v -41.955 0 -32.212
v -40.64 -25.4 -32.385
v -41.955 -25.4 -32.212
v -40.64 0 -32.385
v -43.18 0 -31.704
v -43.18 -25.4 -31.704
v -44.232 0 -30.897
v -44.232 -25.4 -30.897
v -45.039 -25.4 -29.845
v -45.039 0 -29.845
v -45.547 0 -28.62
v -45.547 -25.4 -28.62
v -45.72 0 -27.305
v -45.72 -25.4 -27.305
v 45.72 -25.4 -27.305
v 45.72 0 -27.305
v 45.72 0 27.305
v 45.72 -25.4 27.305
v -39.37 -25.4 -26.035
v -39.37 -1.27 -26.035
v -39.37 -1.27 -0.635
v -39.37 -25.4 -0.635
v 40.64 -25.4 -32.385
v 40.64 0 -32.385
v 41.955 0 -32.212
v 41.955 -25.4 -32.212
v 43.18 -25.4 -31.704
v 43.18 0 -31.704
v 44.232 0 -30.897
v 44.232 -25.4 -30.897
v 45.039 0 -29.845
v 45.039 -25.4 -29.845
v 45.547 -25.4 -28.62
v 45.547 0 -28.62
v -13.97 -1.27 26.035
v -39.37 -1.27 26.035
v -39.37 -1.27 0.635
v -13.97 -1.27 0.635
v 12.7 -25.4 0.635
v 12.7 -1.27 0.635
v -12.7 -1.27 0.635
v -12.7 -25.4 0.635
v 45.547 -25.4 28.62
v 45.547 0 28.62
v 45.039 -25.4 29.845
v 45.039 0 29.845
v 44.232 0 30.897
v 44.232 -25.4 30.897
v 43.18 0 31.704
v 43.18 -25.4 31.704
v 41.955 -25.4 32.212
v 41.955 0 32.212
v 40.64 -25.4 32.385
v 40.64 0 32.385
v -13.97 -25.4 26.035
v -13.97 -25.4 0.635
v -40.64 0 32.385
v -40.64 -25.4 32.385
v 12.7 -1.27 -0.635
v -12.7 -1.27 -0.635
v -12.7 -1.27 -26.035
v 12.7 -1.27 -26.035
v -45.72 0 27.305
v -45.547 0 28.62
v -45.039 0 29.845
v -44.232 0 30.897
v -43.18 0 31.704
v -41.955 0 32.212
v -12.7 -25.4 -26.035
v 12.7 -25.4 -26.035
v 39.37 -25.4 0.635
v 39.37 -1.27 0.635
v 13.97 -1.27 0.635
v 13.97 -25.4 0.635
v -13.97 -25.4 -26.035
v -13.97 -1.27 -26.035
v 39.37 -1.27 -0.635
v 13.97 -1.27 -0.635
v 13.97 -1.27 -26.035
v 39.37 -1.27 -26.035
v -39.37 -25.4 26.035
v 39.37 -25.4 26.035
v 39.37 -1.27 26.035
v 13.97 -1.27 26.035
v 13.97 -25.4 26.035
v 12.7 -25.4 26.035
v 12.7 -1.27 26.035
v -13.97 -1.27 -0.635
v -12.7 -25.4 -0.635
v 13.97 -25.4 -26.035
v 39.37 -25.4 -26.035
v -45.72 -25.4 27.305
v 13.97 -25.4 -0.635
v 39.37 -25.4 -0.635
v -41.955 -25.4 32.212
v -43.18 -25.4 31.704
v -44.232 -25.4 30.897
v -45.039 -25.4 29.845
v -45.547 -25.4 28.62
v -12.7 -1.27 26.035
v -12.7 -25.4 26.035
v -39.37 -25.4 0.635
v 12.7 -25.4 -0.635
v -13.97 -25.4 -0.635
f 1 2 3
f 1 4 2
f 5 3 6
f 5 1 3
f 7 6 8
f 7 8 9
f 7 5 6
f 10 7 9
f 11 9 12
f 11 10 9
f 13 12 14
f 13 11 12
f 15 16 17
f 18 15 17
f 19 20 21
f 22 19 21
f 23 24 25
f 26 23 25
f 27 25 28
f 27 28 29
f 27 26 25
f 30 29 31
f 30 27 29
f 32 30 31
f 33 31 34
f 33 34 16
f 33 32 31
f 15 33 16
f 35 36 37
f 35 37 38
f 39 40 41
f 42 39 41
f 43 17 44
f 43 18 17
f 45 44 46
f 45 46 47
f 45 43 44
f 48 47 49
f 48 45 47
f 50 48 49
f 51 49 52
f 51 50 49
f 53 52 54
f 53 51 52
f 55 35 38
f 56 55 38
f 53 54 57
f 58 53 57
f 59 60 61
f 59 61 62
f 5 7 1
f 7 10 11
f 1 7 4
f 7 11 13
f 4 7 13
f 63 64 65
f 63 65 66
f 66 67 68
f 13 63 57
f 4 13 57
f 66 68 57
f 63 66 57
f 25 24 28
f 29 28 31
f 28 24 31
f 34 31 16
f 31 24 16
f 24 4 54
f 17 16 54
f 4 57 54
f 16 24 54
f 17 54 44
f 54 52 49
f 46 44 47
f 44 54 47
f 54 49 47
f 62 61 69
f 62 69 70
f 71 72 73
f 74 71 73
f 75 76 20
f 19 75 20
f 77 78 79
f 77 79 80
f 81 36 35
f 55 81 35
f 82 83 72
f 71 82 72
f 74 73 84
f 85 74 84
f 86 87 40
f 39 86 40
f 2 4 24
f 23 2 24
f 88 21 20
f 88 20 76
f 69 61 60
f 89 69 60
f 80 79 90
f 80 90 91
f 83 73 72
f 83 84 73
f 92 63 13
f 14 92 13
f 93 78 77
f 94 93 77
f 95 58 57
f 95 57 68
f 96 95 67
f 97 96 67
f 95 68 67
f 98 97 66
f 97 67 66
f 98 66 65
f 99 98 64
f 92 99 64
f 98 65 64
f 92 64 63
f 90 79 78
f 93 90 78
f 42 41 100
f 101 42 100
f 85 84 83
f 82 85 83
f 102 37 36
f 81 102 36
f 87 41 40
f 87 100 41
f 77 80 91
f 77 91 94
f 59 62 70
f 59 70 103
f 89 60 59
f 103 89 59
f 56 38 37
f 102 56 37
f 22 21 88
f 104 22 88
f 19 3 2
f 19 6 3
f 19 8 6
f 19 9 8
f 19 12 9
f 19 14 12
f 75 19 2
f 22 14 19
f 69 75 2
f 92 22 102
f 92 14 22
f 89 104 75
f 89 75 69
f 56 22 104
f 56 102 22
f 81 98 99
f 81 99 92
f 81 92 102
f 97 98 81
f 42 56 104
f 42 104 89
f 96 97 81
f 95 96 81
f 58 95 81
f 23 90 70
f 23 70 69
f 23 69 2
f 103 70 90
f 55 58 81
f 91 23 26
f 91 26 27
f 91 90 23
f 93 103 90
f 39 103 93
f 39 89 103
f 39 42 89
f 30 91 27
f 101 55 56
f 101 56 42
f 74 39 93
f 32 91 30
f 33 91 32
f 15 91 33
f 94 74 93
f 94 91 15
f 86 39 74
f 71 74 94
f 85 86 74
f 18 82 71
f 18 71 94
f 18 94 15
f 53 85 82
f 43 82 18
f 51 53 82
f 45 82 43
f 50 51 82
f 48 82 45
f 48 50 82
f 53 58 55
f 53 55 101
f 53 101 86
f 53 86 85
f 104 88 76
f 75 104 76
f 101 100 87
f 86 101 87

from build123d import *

# Parameters (mm, degrees)
F0_W     = 25.4
F0_H     = 25.4
F1_DEPTH = 25.4
F2_W     = 91.44
F2_H     = 64.77
F3_DEPTH = 1.27
F4_R     = 5.08


with BuildPart() as f1:
    # F0 (on Front) → F1 (new body)
    with BuildSketch(Plane.XZ):
        Polygon((-45.72, -32.385), (45.72, -32.385), (45.72, 32.385), (-38.428448, 32.385), (-45.72, 32.385), (-45.72, 27.392585), align=None)
        Polygon((-39.37, -0.635), (-36.457758, -0.635), (-13.97, -0.635), (-13.97, -26.035), (-39.37, -26.035), align=None, mode=Mode.SUBTRACT)
        with Locations((0, -13.335)):
            Rectangle(F0_W, F0_H, mode=Mode.SUBTRACT)
        with Locations((26.67, -13.335)):
            Rectangle(F0_W, F0_H, mode=Mode.SUBTRACT)
        Polygon((-39.37, 26.035), (-38.428448, 26.035), (-13.97, 26.035), (-13.97, 13.335), (-13.97, 0.635), (-36.457758, 0.635), (-39.37, 0.635), align=None, mode=Mode.SUBTRACT)
        Polygon((-12.7, 0.635), (-12.7, 13.335), (-12.7, 26.035), (12.7, 26.035), (12.7, 15.568449), (12.7, 0.635), align=None, mode=Mode.SUBTRACT)
        Polygon((13.97, 0.635), (13.97, 15.568449), (13.97, 26.035), (39.37, 26.035), (39.37, 0.635), align=None, mode=Mode.SUBTRACT)
    extrude(amount=F1_DEPTH)

    # F2 (on Front) → F3 (join)
    with BuildSketch(Plane.XZ):
        Rectangle(F2_W, F2_H)
    extrude(amount=F3_DEPTH)

    # F4
    f4_edges = [f1.edges().sort_by_distance(p)[0] for p in [
        (-45.72, -12.7, 32.385),
        (45.72, -12.7, 32.385),
        (-45.72, -12.7, -32.385),
        (45.72, -12.7, -32.385),
    ]]
    fillet(f4_edges, radius=F4_R)


solid = f1.part
